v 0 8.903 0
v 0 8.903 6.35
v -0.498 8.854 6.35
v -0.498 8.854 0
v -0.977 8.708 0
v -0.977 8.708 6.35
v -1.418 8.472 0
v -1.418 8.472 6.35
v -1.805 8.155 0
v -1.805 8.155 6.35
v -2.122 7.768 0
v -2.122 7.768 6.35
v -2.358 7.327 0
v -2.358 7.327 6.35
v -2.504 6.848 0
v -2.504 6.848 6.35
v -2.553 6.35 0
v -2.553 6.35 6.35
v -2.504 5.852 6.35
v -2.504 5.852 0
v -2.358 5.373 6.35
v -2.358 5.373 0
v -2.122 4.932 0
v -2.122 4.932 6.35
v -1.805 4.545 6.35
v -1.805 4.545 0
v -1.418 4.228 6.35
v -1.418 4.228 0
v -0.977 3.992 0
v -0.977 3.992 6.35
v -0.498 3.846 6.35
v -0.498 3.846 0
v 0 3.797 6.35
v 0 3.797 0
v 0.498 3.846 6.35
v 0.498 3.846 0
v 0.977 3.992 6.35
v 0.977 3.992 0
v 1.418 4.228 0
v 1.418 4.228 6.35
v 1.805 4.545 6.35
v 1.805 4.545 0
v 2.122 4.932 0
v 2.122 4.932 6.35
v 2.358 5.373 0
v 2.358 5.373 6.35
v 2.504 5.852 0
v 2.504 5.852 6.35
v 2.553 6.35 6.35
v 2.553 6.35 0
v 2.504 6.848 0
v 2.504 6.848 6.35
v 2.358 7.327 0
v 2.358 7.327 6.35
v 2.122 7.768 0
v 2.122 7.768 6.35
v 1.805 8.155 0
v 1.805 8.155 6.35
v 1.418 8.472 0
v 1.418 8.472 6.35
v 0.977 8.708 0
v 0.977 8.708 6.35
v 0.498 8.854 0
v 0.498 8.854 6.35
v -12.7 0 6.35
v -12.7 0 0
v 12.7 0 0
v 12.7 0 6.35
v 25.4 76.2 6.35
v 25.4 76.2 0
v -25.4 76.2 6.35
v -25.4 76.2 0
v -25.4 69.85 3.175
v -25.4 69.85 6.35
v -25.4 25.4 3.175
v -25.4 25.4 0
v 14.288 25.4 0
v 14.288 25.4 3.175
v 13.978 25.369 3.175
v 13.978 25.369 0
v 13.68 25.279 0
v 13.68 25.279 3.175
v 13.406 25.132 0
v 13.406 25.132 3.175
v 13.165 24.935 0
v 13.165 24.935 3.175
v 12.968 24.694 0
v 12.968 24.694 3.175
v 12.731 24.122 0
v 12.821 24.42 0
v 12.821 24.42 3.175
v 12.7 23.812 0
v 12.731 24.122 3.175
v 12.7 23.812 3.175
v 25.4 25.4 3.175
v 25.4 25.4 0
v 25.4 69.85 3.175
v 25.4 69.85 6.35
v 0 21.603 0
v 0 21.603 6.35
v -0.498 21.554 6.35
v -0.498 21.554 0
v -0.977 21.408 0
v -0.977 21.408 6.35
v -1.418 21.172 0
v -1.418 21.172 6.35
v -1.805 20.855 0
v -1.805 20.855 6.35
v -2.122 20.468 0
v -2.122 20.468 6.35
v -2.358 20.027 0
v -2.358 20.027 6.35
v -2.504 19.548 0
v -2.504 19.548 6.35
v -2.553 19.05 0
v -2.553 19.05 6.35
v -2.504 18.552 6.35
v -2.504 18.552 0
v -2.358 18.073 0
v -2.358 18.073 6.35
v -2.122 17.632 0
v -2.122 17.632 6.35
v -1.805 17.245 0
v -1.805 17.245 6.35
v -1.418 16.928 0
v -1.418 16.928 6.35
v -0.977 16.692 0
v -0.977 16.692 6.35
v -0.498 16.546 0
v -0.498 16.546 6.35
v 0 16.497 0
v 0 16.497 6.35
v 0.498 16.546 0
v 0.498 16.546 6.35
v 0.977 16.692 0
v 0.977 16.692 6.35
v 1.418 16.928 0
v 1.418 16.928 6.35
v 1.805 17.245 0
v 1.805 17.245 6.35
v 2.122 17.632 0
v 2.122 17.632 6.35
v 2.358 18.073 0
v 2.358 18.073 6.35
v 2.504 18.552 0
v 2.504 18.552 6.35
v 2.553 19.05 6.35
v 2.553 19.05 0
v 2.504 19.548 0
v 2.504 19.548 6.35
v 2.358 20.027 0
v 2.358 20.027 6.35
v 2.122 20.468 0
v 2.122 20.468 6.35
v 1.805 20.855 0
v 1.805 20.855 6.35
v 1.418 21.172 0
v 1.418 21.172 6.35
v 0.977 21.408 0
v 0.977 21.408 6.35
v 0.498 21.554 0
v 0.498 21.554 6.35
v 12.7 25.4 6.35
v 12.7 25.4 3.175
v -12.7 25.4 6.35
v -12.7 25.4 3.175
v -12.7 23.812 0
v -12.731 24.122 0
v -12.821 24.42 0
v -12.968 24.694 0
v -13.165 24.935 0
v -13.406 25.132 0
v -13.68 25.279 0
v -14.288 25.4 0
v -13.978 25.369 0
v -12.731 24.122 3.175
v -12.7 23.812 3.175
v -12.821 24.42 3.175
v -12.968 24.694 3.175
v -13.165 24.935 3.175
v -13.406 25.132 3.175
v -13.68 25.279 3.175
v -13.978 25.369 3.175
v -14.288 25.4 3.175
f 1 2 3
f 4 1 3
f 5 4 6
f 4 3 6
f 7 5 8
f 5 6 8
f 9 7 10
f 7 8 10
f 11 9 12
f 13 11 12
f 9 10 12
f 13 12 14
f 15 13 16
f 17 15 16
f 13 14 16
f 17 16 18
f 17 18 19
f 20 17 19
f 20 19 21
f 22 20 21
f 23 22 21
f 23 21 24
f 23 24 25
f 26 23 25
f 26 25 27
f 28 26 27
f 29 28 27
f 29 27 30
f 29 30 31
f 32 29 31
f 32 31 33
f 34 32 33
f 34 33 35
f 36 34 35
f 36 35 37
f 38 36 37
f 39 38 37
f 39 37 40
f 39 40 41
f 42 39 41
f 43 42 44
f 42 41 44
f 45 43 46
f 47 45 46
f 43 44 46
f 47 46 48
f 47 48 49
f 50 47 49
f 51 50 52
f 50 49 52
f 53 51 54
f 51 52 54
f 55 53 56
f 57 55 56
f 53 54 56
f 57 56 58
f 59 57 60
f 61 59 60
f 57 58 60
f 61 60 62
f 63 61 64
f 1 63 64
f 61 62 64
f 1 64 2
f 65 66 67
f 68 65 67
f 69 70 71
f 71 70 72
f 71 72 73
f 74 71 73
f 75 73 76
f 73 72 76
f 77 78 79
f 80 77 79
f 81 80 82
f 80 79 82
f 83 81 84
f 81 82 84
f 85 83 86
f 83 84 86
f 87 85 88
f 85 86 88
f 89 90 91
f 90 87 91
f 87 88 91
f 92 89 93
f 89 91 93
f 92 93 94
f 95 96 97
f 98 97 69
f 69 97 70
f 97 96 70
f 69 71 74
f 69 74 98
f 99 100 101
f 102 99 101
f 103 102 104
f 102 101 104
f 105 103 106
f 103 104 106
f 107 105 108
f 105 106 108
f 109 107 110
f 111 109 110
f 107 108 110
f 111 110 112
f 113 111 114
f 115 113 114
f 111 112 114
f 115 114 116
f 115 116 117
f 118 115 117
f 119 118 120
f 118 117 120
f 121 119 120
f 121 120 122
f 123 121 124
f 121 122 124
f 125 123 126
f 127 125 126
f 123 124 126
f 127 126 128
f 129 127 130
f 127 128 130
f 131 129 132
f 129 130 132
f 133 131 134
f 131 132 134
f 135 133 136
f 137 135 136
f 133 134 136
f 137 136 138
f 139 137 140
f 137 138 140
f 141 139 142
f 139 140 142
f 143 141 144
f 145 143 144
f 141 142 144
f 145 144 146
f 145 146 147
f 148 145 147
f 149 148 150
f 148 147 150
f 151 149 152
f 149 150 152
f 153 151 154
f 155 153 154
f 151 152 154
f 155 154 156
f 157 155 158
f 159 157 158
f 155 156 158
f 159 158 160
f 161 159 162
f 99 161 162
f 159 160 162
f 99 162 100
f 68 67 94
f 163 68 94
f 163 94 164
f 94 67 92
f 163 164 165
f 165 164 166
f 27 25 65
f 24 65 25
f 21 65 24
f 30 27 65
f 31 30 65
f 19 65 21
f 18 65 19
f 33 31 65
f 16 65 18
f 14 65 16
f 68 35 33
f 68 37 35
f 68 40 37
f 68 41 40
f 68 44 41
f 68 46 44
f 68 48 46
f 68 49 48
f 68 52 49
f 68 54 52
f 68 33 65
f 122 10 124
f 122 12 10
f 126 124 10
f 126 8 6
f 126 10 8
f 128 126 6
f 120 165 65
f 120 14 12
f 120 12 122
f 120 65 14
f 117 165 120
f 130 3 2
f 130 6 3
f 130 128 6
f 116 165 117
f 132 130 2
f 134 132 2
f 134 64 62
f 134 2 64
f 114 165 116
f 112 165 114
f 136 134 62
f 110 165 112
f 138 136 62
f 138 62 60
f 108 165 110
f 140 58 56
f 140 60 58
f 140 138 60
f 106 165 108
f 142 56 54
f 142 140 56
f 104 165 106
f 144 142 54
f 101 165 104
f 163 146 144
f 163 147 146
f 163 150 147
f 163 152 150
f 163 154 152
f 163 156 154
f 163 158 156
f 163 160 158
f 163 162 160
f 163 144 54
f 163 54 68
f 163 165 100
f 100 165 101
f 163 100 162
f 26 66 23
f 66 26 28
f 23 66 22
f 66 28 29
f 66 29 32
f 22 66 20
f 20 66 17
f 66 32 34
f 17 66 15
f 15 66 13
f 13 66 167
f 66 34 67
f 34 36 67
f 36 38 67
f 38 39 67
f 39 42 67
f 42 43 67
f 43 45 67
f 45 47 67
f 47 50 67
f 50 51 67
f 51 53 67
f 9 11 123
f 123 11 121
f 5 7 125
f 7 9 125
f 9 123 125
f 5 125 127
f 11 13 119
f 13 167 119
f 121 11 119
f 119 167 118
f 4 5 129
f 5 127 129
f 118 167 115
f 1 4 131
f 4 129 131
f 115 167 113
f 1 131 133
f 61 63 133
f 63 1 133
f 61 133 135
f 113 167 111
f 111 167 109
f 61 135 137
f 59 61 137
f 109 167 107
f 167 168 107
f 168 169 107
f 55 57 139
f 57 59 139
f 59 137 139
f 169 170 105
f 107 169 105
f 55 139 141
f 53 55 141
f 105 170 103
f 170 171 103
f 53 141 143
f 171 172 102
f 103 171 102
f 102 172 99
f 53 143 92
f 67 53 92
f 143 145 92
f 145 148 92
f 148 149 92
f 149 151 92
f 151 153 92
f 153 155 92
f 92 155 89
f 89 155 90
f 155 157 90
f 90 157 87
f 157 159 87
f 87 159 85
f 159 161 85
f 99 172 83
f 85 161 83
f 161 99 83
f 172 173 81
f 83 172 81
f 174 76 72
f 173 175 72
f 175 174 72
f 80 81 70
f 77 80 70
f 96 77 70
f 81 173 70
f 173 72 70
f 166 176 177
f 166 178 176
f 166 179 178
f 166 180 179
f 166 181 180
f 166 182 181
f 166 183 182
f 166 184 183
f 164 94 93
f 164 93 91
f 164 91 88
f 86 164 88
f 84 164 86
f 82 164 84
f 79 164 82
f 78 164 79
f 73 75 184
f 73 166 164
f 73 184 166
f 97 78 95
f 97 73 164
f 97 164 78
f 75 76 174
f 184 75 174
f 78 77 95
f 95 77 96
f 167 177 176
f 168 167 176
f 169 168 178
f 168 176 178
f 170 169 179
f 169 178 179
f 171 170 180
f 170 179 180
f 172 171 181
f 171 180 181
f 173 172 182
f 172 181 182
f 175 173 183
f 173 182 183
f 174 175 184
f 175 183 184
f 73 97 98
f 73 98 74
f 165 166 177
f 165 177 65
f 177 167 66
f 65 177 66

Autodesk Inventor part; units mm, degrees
ref_plane "YZ Plane" through (0, 0, 0) normal (1, 0, 0) x (0, 1, 0)
ref_plane "XZ Plane" through (0, 0, 0) normal (0, 1, 0) x (-1, 0, 0)
ref_plane "XY Plane" through (0, 0, 0) normal (0, 0, 1) x (1, 0, 0)
sketch "Sketch1" plane through (0, 0, 0) normal (0, 0, 1) x (1, 0, 0)
  line L0 (-12.7, 0) -> (12.7, 0)
  line L1 (12.7, 0) -> (12.7, 25.4)
  line L2 (12.7, 25.4) -> (-12.7, 25.4)
  line L3 (-12.7, 25.4) -> (-12.7, 0)
  line L4 (-25.4, 25.4) -> (25.4, 25.4)
  line L5 (25.4, 25.4) -> (25.4, 76.2)
  line L6 (25.4, 76.2) -> (-25.4, 76.2)
  line L7 (-25.4, 76.2) -> (-25.4, 25.4)
  point P0 (0, 0)
  point P1 (0, 25.4)
  point P2 (0, 0)
  dimension "d0" = 25.4
  dimension "d1" = 50.8
  dimension "d2" = 25.4
  dimension "d3" = 50.8
extrude "Extrusion1" add sketch "Sketch1" along normal blind 3.175
sketch "Sketch2" plane through (0, 0, 3.175) normal (0, 0, 1) x (1, 0, 0)
  line L0 (-12.7, 0) -> (12.7, 0)
  line L1 (12.7, 0) -> (12.7, 25.4)
  line L2 (12.7, 25.4) -> (-12.7, 25.4)
  line L3 (-12.7, 25.4) -> (-12.7, 0)
  line L4 (25.4, 76.2) -> (25.4, 25.4) projected
  line L5 (-25.4, 76.2) -> (25.4, 76.2) projected
  line L6 (-25.4, 76.2) -> (25.4, 76.2)
  line L7 (25.4, 76.2) -> (25.4, 69.85)
  line L8 (25.4, 69.85) -> (-25.4, 69.85)
  line L9 (-25.4, 69.85) -> (-25.4, 76.2)
  line L10 (-12.7, 0) -> (-12.7, 25.4) projected
  line L11 (12.7, 25.4) -> (12.7, 0) projected
  line L12 (25.4, 25.4) -> (12.7, 25.4) projected
  line L13 (-12.7, 25.4) -> (-25.4, 25.4) projected
  line L14 (-12.7, 25.4) -> (-13.5255, 25.4)
  arc A0 (-12.7, 24.5745) -> (-13.5255, 25.4) centre (-13.5255, 24.5745) ccw
  line L15 (12.7, 25.4) -> (13.5255, 25.4)
  arc A1 (13.5255, 25.4) -> (12.7, 24.5745) centre (13.5255, 24.5745) ccw
  point P0 (0, 0)
  dimension "d17" = 6.35
  dimension "d19" = 0.8255
extrude "Extrusion2" add sketch "Sketch2" along normal blind 3.175 contours L3 L2 L1 L0 | L8 L9 L5 L4
fillet "Fillet1" radius 1.5875 2 edges at (12.7, 25.4, 1.5875) (-12.7, 25.4, 1.5875)
sketch "Sketch3" plane through (0, 0, 0) normal (0, 0, -1) x (-1, 0, 0)
  line L0 (12.7, 0) -> (-12.7, 0) projected
  point P0 (0, 0)
  point P1 (0, 6.35)
  point P2 (0, 19.05)
  point P3 (0, 0)
  dimension "d8" = 12.7
  dimension "d9" = 6.35
hole "Hole1" at (0, 6.35, 0) at (0, 19.05, 0) direction (0, 0, 1) diameter 5.1054 end through all clearance for "Flat Head Machine Screw (82)" size "#10" standard "Ansi Unified Screw Threads"
properties part number "gripper jaw extension"
